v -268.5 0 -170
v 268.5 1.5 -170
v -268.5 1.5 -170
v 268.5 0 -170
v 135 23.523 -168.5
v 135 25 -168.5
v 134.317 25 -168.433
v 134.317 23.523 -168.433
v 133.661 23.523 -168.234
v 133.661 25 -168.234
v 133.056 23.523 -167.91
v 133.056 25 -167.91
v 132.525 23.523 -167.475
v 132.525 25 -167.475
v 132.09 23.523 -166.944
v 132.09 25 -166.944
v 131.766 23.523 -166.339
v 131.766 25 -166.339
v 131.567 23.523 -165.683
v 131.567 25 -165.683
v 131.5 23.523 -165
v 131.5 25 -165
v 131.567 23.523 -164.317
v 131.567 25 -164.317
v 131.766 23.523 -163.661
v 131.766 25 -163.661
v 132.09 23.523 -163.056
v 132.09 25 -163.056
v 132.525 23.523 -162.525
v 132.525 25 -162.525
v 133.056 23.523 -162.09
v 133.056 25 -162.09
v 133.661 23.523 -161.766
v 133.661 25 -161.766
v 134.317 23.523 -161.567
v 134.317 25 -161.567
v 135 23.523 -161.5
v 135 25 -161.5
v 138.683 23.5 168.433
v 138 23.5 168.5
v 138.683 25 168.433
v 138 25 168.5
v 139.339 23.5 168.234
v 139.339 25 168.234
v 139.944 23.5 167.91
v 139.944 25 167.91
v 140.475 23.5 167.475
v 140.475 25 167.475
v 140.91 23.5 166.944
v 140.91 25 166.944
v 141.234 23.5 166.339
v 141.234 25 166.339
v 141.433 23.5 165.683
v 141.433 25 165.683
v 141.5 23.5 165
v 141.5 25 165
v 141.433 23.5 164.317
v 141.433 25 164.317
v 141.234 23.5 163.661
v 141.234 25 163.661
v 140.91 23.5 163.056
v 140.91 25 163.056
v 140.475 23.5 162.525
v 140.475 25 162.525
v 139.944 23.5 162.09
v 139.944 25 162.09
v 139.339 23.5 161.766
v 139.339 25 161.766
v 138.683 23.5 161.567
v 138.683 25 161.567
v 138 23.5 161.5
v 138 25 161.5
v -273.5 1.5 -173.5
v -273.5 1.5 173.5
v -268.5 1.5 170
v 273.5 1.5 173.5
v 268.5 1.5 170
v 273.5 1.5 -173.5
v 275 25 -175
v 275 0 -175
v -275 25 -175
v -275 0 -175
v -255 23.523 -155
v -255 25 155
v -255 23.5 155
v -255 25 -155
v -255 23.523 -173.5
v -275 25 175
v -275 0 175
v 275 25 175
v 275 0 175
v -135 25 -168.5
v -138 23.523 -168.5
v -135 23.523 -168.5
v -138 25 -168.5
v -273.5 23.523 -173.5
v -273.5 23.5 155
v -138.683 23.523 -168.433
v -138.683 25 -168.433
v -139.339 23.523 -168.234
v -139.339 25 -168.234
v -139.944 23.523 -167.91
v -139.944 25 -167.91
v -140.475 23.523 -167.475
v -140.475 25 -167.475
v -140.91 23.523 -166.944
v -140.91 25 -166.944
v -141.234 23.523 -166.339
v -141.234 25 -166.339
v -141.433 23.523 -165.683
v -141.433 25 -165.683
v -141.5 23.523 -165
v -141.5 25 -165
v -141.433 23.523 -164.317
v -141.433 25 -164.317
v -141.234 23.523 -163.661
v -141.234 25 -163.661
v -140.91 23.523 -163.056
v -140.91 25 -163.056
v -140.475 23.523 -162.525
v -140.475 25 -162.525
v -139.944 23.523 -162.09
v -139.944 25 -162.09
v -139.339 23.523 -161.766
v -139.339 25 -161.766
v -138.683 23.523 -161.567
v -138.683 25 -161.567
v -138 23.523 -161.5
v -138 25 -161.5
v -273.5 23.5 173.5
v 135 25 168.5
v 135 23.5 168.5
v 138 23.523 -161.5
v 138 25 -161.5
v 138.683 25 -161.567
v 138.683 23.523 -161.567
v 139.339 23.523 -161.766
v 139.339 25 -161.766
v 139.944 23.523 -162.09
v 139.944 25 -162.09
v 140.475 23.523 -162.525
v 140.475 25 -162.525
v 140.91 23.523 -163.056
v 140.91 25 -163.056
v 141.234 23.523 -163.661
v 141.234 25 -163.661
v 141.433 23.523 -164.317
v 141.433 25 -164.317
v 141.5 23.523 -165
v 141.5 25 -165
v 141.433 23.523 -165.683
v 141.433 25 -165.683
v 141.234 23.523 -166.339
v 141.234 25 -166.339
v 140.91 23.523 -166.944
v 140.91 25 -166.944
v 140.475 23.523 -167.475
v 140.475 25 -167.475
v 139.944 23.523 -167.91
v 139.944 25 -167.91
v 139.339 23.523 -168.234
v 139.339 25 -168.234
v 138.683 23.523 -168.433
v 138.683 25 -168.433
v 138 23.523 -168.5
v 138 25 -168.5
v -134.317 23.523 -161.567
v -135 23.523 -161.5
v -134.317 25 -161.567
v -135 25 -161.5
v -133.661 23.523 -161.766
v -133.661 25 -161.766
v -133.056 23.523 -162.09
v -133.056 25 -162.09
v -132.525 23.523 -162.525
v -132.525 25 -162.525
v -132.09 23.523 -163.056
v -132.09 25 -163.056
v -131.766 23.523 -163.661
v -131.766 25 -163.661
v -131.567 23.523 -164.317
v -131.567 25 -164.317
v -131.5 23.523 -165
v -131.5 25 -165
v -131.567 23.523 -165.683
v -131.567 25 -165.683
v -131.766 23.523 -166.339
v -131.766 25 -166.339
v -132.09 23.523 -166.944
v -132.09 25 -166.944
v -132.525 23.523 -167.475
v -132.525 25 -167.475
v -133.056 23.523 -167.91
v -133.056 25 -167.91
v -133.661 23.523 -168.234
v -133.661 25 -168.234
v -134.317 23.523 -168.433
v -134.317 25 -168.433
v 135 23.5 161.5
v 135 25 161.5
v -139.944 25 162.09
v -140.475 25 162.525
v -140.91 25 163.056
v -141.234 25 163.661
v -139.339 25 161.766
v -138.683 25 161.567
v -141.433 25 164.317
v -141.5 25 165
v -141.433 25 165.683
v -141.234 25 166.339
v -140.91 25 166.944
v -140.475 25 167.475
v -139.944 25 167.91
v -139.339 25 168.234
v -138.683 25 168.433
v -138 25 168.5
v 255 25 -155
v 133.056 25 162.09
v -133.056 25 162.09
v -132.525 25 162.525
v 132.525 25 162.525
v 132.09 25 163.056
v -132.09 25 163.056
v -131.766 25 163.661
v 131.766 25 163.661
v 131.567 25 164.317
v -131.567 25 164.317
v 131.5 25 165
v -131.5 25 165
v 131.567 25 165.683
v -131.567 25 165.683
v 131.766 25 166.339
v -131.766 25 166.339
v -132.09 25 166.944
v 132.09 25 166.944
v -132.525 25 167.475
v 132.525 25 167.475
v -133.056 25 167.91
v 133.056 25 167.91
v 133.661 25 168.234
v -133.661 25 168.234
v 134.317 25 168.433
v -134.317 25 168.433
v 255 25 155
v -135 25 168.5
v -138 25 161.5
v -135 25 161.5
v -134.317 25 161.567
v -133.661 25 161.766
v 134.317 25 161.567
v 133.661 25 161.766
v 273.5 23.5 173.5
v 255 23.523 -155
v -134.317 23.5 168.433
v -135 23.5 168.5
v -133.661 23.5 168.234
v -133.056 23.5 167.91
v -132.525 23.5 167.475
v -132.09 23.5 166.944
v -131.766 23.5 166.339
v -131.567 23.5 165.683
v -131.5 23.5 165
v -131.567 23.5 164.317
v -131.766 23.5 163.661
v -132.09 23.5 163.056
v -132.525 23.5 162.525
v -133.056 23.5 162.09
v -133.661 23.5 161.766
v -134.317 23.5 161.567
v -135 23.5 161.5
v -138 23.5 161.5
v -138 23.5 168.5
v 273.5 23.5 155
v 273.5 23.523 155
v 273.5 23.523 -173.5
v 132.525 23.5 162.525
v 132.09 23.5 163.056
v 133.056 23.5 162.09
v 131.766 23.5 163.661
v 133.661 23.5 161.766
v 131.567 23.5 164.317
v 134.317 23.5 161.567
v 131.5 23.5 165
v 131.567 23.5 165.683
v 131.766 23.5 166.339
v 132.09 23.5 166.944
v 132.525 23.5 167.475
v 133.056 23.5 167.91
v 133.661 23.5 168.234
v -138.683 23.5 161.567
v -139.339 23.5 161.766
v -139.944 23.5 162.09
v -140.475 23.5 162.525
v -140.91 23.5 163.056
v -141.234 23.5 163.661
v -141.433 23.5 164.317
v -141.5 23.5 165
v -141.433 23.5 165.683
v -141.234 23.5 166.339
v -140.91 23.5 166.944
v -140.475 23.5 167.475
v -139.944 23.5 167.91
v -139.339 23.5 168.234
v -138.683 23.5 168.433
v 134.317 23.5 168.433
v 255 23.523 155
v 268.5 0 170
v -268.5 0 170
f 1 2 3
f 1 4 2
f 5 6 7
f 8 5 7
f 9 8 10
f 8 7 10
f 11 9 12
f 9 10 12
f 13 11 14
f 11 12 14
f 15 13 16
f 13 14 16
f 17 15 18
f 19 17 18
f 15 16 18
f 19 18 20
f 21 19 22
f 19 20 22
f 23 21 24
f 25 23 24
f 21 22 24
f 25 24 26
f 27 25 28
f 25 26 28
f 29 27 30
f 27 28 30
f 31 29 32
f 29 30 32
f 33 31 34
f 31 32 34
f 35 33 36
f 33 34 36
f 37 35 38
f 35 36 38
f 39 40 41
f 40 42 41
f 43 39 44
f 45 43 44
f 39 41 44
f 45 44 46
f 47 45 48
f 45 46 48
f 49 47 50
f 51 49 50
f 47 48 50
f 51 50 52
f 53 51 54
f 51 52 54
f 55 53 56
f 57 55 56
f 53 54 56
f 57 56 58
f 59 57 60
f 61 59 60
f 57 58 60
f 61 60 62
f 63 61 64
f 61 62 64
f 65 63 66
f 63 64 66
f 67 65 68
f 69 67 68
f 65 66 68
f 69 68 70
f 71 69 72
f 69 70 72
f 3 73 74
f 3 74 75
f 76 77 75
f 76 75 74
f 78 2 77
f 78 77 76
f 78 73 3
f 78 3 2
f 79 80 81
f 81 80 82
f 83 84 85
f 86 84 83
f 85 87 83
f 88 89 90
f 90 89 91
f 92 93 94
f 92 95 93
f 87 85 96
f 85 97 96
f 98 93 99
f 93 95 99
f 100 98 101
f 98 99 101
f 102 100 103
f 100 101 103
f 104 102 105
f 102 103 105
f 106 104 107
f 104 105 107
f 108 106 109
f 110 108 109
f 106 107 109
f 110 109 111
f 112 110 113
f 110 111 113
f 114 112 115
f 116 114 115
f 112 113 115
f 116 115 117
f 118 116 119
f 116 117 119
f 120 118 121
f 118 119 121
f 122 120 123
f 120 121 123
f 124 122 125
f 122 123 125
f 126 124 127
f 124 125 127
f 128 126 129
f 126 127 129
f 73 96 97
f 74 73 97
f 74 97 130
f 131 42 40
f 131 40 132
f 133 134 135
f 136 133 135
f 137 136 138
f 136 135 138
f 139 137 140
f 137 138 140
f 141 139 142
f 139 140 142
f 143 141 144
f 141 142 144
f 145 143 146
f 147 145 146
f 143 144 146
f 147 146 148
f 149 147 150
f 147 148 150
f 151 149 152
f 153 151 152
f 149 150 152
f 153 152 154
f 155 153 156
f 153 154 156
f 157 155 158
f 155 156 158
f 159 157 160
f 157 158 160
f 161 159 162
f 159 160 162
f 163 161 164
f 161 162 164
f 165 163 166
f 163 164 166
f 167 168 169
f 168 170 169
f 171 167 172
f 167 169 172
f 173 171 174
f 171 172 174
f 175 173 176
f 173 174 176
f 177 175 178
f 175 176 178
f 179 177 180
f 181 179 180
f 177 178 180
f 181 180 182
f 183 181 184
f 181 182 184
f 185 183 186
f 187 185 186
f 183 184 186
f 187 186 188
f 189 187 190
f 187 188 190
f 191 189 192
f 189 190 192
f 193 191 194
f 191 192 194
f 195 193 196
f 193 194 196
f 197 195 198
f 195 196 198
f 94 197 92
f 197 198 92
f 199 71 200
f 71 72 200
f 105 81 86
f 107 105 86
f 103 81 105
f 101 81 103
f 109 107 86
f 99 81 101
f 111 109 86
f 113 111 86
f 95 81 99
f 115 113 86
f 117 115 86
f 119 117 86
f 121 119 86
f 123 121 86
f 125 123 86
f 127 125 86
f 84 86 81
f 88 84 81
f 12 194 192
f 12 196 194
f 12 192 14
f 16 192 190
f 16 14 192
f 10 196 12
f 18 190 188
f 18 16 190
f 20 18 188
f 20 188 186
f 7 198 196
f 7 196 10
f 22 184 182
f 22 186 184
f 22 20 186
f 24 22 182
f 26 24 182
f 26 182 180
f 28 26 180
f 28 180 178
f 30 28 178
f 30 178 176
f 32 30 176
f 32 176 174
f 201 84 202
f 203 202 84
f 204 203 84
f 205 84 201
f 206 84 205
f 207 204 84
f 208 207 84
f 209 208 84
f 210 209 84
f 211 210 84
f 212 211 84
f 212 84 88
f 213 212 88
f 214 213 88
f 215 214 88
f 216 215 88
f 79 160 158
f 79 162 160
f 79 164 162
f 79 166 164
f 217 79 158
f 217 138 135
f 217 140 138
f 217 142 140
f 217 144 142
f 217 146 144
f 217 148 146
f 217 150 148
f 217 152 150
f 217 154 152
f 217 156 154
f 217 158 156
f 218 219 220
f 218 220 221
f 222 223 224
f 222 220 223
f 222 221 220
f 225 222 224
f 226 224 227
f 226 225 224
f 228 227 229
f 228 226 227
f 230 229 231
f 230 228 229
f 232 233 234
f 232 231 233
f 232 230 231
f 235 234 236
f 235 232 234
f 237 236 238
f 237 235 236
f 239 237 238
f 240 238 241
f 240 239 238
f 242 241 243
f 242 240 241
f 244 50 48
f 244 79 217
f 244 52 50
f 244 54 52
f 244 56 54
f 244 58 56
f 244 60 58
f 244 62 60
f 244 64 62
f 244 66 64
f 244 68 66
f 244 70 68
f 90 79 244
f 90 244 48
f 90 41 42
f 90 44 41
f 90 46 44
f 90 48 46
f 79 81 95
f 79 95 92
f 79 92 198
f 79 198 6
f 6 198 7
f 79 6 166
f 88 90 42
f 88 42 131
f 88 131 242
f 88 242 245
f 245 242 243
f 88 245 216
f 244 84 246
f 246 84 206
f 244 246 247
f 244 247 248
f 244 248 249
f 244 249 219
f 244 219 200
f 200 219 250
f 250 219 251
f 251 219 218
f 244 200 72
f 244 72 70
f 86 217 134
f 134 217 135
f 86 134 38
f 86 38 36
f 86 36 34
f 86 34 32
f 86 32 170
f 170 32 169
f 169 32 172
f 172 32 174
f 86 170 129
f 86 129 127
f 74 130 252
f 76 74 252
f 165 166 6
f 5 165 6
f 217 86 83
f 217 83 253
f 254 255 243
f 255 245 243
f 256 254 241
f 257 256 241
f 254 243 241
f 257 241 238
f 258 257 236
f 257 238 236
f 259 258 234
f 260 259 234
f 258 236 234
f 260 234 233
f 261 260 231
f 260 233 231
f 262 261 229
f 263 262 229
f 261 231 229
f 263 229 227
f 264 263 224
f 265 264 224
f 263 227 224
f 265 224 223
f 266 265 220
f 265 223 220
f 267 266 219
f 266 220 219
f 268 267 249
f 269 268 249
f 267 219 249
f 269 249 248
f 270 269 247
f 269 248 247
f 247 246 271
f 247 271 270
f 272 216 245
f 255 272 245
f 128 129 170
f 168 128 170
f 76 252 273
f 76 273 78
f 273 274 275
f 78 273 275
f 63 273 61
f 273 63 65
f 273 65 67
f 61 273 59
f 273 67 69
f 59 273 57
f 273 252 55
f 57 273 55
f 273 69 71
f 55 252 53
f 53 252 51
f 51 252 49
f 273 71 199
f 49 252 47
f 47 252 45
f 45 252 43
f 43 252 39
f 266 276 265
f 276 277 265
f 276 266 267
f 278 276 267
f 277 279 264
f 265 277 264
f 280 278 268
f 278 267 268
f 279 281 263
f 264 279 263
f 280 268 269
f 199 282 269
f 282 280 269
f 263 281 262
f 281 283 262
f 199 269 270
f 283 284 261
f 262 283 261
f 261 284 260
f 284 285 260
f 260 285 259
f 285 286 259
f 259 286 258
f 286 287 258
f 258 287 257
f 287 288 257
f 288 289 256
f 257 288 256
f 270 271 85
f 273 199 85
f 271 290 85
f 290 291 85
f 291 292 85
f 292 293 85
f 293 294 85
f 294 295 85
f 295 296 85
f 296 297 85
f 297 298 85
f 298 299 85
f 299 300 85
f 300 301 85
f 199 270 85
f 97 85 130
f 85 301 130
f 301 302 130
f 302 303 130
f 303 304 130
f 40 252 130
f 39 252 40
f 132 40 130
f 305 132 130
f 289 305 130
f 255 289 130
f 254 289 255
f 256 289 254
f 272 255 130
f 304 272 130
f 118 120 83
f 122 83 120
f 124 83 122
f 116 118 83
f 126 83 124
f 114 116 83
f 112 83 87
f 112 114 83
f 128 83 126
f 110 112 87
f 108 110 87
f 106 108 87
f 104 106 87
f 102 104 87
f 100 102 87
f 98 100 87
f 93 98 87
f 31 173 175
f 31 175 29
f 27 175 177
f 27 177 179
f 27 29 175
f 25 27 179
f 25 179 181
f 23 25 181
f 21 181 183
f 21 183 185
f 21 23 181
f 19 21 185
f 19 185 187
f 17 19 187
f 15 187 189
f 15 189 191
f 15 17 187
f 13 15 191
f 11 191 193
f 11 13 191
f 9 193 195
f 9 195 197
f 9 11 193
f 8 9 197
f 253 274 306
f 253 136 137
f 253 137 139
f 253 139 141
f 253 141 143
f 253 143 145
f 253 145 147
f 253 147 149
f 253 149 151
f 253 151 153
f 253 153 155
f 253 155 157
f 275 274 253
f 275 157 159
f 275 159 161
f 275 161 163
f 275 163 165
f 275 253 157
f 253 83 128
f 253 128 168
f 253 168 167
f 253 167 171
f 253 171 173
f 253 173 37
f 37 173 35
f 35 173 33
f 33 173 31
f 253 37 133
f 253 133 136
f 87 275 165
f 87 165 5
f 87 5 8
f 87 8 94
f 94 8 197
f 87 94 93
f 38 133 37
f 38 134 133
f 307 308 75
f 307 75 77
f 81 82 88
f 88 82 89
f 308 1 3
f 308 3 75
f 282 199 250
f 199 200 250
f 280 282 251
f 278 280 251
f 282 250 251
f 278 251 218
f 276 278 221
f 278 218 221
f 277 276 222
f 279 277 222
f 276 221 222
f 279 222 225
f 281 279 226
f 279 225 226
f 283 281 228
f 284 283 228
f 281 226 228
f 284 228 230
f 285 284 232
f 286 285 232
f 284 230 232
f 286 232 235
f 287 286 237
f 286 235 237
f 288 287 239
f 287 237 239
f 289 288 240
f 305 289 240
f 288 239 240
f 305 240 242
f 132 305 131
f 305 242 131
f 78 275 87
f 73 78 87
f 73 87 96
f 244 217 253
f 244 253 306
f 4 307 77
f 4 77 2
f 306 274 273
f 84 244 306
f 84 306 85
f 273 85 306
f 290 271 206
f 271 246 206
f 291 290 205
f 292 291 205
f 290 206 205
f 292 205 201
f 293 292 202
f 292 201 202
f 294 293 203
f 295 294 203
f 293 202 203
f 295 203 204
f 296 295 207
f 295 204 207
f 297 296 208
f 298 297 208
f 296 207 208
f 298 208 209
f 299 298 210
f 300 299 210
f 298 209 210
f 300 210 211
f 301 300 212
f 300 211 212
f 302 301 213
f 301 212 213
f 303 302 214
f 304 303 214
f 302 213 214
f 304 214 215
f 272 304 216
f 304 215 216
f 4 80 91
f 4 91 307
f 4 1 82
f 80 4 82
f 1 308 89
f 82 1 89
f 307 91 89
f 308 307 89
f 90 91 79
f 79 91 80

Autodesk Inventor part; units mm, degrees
ref_plane "YZ Plane" through (0, 0, 0) normal (1, 0, 0) x (0, 1, 0)
ref_plane "XZ Plane" through (0, 0, 0) normal (0, 1, 0) x (-1, 0, 0)
ref_plane "XY Plane" through (0, 0, 0) normal (0, 0, 1) x (1, 0, 0)
sketch "Boceto1" plane through (0, 0, 0) normal (0, 1, 0) x (-1, 0, 0)
  line L0 (867.2697, 0) -> (-1087.5334, 0) construction
  line L1 (0, 1692.3308) -> (0, -1743.0334) construction
  line L2 (-275, -175) -> (275, -175)
  line L3 (275, -175) -> (275, 175)
  line L4 (275, 175) -> (-275, 175)
  line L5 (-275, 175) -> (-275, -175)
  line L6 (-275, -175) -> (275, 175) construction
  line L7 (275, -175) -> (-275, 175) construction
  point P0 (0, 0)
  dimension "d0" = 550
  dimension "d1" = 350
extrude "Extrusión1" add sketch "Boceto1" along normal blind 25
sketch "Boceto2" plane through (0, 25, 0) normal (0, 1, 0) x (1, 0, 0)
  line L0 (273.5, 173.5) -> (-273.5, 173.5)
  line L1 (-273.5, 173.5) -> (-273.5, -173.5)
  line L2 (-273.5, -173.5) -> (273.5, -173.5)
  line L3 (273.5, -173.5) -> (273.5, 173.5)
  line L4 (273.5, 173.5) -> (-273.5, -173.5) construction
  line L5 (-273.5, 173.5) -> (273.5, -173.5) construction
  line L6 (-275, 175) -> (-275, -175) projected
  line L7 (-275, -175) -> (275, -175) projected
  point P0 (0, 0)
  dimension "d4" = 1.5
  dimension "d5" = 1.5
extrude "Extrusión2" cut sketch "Boceto2" against normal blind 23.5
sketch "Boceto3" plane through (273.5, 25, 173.5) normal (0, 0, -1) x (-1, 0, 0)
  line L0 (0, 0) -> (547, 0) projected
  line L1 (547, 0) -> (0, 0)
  line L2 (0, 0) -> (0, -1.5)
  line L3 (0, -1.5) -> (546.8806, -1.5)
  line L4 (546.8806, -1.5) -> (547, -1.5)
  line L5 (547, -1.5) -> (547, 0)
  point P0 (273.5, -25)
  dimension "d8" = 1.5
extrude "Extrusión3" add sketch "Boceto3" along normal blind 18.5
sketch "Boceto4" plane through (-273.5, 1.5, -173.5) normal (1, 0, 0) x (0, 0, -1)
  line L0 (-328.5, 23.5) -> (0, 23.5) projected
  line L1 (-328.5, 23.5) -> (-328.5, 22) projected
  line L2 (0, 23.5) -> (-328.5, 23.5)
  line L3 (-328.5, 23.5) -> (-328.5, 22)
  line L4 (-328.5, 22) -> (0, 22.0229)
  line L5 (0, 23.5) -> (0, 0) projected
  point P0 (-173.5, -1.5)
  dimension "d11" = 1.5
extrude "Extrusión4" add sketch "Boceto4" along normal blind 18.5
sketch "Boceto5" plane through (-273.5, 1.5, -173.5) normal (0, 0, 1) x (1, 0, 0)
  line L0 (548.5, 23.5) -> (-1.5, 23.5) projected
  line L1 (546.9606, 23.5) -> (18.5241, 23.5)
  line L2 (18.5, 23.5) -> (18.5, 22.0229) projected
  line L3 (18.5, 22.0229) -> (547, 22.0229)
  line L4 (547, 23.5) -> (547, 0) projected
  line L5 (547, 23.5) -> (546.9606, 23.5)
  point P0 (273.5, -1.5)
extrude "Extrusión5" add sketch "Boceto5" along normal blind 18.5
sketch "Boceto6" plane through (273.5, 1.5, -173.5) normal (-1, 0, 0) x (0, 0, 1)
  line L0 (18.5, 23.5) -> (328.5, 23.5) projected
  line L1 (18.5, 23.5) -> (328.5, 23.5)
  line L2 (328.5, 23.5) -> (328.5, 22.0229)
  line L3 (18.5, 23.5) -> (18.5, 22.0229) projected
  line L4 (328.5, 22.0229) -> (18.5, 22.0229)
  line L5 (18.5, 22.0229) -> (18.5, 23.5)
  point P0 (173.5, -1.5)
extrude "Extrusión6" add sketch "Boceto6" along normal blind 18.5
sketch "Boceto7" plane through (0, 0, 0) normal (0, -1, 0) x (1, 0, 0)
  line L0 (268.5, -170) -> (-268.5, -170)
  line L1 (-268.5, -170) -> (-268.5, 170)
  line L2 (-268.5, 170) -> (268.5, 170)
  line L3 (268.5, 170) -> (268.5, -170)
  line L4 (268.5, -170) -> (-268.5, 170) construction
  line L5 (-268.5, -170) -> (268.5, 170) construction
  line L6 (-275, 175) -> (275, 175) projected
  line L7 (-273.5, 173.5) -> (-273.5, -173.5) projected
  point P0 (0, 0)
  dimension "d18" = 5
  dimension "d19" = 5
extrude "Extrusión7" cut sketch "Boceto7" against normal blind 10
sketch "Boceto8" plane through (0, 25, 0) normal (0, 1, 0) x (1, 0, 0)
  line L0 (-268.5, -170) -> (-268.5, 170) projected
  line L1 (-268.5, 122.5507) -> (-268.5, 115.1946)
  line L2 (-268.5, -170) -> (268.5, -170) projected
  line L3 (-149.9016, -170) -> (-169.2021, -170)
  line L4 (-138, -161.5) -> (-135, -161.5)
  line L5 (-138, -168.5) -> (-135, -168.5)
  arc A0 (-138, -161.5) -> (-138, -168.5) centre (-138, -165) ccw
  arc A1 (-135, -168.5) -> (-135, -161.5) centre (-135, -165) ccw
  line L6 (-255, -155) -> (255, -155) projected
  line L7 (-275, 175) -> (-275, -175) projected
  line L8 (-288.7354, 0) -> (111.6009, 0) construction
  line L9 (0, -308.0533) -> (0, 294.465) construction
  line L10 (138, -161.5) -> (135, -161.5)
  line L11 (138, -168.5) -> (135, -168.5)
  arc A2 (138, -168.5) -> (138, -161.5) centre (138, -165) ccw
  arc A3 (135, -161.5) -> (135, -168.5) centre (135, -165) ccw
  line L12 (288.7354, 0) -> (-111.6009, 0) construction
  line L13 (-138, 161.5) -> (-135, 161.5)
  line L14 (-138, 168.5) -> (-135, 168.5)
  arc A4 (-138, 168.5) -> (-138, 161.5) centre (-138, 165) ccw
  arc A5 (-135, 161.5) -> (-135, 168.5) centre (-135, 165) ccw
  arc A6 (135, 168.5) -> (135, 161.5) centre (135, 165) ccw
  line L15 (138, 161.5) -> (135, 161.5)
  arc A7 (138, 161.5) -> (138, 168.5) centre (138, 165) ccw
  line L16 (138, 168.5) -> (135, 168.5)
  point P0 (0, 0)
  dimension "d22" = 10
  dimension "d23" = 7
  dimension "d24" = 3
  dimension "d25" = 137
extrude "Extrusión8" cut sketch "Boceto8" against normal blind 10
properties part number "marco"
